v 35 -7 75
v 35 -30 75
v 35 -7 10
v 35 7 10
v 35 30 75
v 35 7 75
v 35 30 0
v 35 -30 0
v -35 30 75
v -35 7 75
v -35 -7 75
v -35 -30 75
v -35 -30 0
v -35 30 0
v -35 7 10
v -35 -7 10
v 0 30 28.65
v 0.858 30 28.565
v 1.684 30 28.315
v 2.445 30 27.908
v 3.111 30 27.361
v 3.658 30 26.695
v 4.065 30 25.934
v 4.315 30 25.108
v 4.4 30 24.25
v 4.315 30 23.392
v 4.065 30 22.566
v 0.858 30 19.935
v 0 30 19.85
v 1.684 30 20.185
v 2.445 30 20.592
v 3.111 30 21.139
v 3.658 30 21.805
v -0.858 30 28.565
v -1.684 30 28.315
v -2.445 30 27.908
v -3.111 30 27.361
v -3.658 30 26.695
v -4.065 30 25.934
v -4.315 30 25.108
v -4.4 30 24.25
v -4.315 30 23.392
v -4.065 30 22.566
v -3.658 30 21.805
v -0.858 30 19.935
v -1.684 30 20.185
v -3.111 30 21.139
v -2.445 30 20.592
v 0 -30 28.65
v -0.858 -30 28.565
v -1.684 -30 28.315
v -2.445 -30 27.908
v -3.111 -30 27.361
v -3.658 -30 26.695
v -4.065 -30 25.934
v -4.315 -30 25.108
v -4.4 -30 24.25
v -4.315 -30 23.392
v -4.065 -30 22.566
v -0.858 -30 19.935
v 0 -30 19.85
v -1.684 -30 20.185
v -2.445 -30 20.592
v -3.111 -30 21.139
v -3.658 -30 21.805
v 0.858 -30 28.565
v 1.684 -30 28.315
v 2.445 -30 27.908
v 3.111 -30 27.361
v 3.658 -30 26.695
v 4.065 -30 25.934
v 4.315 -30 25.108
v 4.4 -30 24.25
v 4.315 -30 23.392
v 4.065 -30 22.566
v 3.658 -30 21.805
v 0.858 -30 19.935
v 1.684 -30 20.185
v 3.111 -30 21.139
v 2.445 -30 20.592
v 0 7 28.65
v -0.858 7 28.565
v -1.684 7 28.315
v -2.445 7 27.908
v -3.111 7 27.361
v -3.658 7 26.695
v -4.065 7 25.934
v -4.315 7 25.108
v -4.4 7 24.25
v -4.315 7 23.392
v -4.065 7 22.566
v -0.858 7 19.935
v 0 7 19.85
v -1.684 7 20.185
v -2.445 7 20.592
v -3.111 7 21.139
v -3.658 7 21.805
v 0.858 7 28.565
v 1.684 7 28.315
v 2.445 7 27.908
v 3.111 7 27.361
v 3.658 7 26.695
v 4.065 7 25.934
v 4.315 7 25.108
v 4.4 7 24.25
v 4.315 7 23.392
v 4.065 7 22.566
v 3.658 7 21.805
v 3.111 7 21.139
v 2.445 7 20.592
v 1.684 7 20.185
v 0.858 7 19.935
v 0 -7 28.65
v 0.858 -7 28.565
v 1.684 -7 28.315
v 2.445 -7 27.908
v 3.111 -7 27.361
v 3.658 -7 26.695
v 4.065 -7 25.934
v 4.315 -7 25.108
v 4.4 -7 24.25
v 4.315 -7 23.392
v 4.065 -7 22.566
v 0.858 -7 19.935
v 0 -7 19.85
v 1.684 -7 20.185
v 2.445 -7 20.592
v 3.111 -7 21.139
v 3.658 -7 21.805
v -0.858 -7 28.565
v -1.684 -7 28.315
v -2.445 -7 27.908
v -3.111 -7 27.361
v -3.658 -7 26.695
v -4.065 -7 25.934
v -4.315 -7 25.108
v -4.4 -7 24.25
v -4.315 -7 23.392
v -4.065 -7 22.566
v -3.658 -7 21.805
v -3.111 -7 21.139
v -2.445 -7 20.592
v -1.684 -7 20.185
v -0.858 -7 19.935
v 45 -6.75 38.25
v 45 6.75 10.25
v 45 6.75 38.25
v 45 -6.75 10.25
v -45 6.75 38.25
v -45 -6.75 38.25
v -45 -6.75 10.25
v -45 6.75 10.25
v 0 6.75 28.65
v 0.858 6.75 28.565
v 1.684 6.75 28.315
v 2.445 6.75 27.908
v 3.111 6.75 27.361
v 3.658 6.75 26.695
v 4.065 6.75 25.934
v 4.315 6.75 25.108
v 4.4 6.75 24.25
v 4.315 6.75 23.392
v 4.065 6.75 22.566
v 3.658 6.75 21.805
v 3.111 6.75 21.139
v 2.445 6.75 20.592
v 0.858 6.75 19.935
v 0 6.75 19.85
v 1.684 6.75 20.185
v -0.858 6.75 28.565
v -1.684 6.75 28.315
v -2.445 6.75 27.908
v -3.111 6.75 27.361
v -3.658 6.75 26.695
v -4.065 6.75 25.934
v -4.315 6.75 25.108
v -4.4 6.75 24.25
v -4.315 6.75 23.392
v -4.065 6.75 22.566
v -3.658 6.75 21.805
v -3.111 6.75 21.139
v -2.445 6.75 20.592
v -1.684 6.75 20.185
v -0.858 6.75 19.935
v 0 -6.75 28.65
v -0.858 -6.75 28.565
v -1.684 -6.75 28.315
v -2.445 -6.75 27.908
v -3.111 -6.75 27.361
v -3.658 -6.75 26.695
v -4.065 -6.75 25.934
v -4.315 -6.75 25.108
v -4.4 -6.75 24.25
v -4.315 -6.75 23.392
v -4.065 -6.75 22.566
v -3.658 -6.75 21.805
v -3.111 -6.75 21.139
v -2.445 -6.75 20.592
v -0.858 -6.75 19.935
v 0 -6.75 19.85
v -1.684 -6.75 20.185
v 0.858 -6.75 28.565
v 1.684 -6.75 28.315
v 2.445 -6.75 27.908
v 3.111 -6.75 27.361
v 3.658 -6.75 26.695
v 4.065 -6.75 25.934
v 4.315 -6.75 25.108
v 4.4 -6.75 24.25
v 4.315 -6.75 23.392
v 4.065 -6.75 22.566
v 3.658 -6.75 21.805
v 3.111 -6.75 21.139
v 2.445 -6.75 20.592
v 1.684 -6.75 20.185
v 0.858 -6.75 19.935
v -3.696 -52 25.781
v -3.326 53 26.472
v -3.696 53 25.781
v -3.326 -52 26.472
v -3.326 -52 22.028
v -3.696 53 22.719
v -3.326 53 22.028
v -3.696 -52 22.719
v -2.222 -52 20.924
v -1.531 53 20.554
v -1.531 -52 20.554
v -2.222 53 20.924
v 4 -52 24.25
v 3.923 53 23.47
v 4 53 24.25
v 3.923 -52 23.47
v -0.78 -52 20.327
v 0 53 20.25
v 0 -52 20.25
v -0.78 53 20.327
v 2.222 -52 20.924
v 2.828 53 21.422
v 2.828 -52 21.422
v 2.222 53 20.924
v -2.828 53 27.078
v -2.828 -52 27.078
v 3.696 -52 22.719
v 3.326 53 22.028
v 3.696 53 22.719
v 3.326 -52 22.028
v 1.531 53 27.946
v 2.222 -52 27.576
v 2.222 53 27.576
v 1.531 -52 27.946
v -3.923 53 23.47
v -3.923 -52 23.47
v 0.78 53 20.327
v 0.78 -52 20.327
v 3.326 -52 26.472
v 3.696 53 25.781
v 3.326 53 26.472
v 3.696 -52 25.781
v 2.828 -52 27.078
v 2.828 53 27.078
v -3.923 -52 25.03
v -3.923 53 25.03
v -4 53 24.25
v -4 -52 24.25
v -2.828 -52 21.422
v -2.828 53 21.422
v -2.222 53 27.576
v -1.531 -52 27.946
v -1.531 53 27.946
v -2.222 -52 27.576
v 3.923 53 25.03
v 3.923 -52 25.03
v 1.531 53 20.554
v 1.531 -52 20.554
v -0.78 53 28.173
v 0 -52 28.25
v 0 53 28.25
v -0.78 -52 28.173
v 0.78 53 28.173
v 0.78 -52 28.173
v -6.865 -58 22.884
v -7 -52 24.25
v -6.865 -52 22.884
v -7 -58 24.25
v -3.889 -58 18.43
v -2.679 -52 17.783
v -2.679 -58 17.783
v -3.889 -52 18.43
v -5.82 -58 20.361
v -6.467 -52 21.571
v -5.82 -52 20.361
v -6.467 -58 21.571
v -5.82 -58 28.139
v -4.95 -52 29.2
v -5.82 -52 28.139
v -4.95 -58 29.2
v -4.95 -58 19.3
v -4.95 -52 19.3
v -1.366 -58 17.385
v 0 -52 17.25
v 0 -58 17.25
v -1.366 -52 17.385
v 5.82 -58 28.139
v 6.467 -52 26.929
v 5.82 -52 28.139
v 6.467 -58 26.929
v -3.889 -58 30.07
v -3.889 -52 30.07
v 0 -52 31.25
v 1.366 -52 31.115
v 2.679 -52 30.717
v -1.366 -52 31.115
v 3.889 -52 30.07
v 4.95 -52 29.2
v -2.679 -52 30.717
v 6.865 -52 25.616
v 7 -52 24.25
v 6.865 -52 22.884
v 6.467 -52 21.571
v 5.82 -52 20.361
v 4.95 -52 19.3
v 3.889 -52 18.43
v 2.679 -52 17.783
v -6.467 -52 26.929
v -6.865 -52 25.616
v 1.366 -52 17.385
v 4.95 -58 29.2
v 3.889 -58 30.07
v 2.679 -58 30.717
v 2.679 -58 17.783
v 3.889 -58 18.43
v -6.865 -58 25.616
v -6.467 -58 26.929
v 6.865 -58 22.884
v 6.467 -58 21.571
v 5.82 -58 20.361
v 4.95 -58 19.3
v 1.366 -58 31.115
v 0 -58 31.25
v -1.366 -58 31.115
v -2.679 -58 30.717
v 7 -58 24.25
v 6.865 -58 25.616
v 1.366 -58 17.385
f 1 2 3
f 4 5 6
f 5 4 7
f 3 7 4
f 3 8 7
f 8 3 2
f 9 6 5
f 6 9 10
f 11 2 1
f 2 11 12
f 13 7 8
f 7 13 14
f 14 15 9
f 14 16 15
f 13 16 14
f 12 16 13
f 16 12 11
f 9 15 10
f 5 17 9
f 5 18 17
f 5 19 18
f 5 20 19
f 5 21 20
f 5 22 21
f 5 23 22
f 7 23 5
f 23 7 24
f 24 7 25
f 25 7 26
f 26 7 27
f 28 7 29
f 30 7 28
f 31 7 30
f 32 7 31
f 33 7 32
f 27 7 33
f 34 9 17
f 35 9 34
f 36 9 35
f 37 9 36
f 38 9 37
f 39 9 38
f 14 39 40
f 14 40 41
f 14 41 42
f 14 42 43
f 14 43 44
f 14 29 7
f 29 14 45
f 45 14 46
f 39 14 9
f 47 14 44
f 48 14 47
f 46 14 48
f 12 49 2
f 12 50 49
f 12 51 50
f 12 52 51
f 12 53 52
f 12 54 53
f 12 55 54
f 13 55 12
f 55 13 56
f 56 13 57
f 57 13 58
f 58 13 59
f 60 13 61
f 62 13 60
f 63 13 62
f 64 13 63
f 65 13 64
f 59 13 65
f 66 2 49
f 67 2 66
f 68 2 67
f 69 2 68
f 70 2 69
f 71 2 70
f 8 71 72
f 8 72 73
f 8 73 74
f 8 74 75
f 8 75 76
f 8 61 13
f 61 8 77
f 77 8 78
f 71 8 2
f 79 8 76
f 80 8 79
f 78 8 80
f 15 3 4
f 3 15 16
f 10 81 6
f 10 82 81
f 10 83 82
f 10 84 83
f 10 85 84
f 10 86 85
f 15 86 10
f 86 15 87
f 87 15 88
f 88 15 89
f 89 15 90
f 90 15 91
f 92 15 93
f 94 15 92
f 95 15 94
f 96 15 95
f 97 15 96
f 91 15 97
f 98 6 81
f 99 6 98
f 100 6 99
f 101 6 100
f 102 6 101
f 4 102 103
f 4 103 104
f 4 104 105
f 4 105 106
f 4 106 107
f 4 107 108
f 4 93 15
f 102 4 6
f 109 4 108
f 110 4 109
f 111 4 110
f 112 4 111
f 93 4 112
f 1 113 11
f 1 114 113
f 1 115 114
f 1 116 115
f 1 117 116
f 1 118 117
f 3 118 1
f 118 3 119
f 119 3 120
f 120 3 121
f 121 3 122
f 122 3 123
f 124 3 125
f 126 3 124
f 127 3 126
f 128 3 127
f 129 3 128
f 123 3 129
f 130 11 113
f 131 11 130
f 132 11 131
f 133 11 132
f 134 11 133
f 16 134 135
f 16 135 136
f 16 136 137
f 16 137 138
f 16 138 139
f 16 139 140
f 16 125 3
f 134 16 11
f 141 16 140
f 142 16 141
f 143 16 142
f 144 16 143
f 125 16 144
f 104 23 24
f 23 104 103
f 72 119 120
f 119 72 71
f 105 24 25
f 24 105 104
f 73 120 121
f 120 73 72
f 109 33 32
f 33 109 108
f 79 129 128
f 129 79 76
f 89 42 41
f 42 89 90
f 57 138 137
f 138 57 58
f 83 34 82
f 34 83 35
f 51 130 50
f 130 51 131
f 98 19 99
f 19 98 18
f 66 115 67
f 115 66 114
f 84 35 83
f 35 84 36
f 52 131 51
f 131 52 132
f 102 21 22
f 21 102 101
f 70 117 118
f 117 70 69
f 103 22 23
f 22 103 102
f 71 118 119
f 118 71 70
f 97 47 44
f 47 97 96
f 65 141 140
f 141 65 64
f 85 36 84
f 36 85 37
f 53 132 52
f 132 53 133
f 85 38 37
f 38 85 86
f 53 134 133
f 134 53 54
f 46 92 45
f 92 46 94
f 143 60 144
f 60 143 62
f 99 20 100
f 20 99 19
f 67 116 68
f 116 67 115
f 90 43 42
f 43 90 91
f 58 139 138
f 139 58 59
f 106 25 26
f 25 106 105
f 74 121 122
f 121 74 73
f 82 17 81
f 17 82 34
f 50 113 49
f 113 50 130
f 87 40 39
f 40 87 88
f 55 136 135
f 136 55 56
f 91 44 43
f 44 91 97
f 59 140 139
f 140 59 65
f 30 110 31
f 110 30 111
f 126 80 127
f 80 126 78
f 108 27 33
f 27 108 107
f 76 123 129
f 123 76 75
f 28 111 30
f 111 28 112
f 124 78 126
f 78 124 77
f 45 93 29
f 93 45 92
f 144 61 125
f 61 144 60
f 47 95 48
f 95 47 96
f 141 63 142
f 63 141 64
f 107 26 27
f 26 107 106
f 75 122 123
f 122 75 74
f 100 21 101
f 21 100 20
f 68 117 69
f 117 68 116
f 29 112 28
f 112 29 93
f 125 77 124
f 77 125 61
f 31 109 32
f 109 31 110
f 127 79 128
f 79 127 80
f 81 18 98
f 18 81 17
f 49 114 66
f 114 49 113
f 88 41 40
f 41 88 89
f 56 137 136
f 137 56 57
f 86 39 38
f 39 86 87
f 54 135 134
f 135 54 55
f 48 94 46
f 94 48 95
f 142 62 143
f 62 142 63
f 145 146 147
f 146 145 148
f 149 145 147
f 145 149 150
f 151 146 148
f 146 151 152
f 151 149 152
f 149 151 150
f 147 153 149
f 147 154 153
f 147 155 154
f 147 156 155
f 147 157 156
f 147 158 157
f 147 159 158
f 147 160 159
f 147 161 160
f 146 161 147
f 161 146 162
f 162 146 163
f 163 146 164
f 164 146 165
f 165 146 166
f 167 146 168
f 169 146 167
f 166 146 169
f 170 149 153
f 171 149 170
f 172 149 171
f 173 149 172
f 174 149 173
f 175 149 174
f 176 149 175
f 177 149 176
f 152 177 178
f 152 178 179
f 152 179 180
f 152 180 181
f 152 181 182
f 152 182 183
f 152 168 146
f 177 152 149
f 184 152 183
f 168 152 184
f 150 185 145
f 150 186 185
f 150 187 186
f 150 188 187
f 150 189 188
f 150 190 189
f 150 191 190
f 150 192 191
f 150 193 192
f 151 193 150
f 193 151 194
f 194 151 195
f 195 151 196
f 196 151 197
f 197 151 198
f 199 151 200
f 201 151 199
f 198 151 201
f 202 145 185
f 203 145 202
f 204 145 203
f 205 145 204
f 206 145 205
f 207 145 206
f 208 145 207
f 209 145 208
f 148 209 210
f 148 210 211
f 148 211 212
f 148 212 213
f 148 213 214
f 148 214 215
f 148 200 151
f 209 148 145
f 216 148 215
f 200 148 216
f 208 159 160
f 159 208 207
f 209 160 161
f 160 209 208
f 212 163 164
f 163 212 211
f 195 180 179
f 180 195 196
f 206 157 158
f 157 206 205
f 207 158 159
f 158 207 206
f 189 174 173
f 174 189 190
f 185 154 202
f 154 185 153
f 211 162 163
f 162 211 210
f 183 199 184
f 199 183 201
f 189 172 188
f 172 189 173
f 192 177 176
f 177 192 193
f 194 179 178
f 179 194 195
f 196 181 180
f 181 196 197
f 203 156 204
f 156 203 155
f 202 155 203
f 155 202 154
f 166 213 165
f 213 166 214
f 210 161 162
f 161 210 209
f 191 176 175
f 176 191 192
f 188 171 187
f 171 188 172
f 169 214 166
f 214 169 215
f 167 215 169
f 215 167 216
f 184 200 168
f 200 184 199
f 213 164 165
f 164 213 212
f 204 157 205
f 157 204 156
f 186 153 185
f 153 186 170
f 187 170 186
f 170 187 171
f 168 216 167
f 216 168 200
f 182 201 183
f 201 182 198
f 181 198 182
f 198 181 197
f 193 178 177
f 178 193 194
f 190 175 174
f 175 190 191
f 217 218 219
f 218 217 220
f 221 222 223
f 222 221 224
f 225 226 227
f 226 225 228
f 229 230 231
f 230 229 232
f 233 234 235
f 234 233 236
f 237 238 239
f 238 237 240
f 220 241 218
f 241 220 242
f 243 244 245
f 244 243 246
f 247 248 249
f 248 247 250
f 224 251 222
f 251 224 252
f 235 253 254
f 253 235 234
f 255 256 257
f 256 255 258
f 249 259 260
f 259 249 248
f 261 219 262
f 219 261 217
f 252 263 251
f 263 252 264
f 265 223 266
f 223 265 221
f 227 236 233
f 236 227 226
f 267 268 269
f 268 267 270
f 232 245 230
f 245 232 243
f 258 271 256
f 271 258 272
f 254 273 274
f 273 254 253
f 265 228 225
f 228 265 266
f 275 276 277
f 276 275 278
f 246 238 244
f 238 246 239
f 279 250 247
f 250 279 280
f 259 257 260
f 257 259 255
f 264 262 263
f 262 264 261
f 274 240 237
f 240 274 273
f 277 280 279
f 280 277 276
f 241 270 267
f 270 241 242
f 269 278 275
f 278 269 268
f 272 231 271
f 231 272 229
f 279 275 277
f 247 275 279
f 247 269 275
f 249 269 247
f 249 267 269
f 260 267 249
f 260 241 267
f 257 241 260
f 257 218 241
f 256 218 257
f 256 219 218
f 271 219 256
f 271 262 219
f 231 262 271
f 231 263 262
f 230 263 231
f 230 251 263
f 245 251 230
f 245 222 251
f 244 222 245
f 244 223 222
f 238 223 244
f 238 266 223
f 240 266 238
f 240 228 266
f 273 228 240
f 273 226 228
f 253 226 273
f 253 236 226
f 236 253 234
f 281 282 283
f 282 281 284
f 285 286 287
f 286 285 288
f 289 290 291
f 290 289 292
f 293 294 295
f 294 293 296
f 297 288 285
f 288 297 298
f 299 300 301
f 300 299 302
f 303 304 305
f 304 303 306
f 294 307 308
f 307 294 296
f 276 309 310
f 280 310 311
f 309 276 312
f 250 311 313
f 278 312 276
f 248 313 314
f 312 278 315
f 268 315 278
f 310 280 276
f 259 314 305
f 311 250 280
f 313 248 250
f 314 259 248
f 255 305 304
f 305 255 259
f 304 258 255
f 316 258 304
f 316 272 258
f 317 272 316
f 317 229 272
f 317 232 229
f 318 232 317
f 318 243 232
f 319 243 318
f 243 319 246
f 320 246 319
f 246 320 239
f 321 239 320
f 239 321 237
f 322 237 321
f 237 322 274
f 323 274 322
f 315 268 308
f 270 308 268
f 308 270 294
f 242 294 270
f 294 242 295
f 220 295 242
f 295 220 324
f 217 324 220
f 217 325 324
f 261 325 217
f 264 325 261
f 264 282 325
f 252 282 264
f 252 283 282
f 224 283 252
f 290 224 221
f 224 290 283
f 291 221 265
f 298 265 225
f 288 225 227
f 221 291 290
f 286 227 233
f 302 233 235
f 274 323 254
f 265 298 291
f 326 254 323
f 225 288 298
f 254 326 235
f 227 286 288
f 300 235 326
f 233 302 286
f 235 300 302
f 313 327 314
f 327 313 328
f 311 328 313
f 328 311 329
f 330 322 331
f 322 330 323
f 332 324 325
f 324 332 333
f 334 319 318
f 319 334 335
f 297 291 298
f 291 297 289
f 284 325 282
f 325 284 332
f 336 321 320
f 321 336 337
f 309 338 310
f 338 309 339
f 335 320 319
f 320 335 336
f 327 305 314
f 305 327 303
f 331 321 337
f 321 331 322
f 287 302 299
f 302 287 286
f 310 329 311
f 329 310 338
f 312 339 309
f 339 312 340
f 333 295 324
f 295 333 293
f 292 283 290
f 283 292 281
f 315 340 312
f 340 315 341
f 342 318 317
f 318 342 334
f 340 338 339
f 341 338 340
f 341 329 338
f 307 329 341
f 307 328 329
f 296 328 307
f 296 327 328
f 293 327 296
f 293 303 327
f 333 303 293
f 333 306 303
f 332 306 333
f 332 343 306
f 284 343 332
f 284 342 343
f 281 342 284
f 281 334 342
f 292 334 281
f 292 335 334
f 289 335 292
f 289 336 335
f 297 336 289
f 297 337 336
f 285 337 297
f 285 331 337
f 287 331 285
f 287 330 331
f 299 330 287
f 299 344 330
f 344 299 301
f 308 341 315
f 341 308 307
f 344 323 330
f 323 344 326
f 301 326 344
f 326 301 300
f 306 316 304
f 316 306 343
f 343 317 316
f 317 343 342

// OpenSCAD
$fn = 32;

// ------------------------------------------------------------------------
// Clevis joint: 70 mm clevis, pin d8
// Every part is its own module, assembly() places them once.
// ------------------------------------------------------------------------

// --- part 1 ---
module clevis() {
  difference() {
    translate([-35, -30, 0]) cube([70, 60, 75]);
    translate([-36, -7, 10]) cube([72, 14, 66]);
    translate([0, 0, 24.25]) rotate([90, 0, 0]) cylinder(h = 62, d = 8.8, center = true);
  }
}

// --- part 2 ---
module eye() {
  difference() {
    translate([-45, -6.75, 0]) cube([90, 13.5, 28]);
    translate([0, 0, 14]) rotate([90, 0, 0]) cylinder(h = 15.5, d = 8.8, center = true);
  }
}

// --- part 3 ---
module pin() {
  rotate([0, 90, 0]) cylinder(h = 106, d = 8, center = true);
  translate([-58, 0, 0]) rotate([0, 90, 0]) cylinder(h = 6, d = 14);
}

// --- assembly ---
module assembly() {
  translate([0, 0, 0]) rotate([0, 0, 0]) clevis();
  translate([0, 0, 10.25]) rotate([0, 0, 0]) eye();
  translate([0, 0, 24.25]) rotate([0, 0, 90]) pin();
}

assembly();
